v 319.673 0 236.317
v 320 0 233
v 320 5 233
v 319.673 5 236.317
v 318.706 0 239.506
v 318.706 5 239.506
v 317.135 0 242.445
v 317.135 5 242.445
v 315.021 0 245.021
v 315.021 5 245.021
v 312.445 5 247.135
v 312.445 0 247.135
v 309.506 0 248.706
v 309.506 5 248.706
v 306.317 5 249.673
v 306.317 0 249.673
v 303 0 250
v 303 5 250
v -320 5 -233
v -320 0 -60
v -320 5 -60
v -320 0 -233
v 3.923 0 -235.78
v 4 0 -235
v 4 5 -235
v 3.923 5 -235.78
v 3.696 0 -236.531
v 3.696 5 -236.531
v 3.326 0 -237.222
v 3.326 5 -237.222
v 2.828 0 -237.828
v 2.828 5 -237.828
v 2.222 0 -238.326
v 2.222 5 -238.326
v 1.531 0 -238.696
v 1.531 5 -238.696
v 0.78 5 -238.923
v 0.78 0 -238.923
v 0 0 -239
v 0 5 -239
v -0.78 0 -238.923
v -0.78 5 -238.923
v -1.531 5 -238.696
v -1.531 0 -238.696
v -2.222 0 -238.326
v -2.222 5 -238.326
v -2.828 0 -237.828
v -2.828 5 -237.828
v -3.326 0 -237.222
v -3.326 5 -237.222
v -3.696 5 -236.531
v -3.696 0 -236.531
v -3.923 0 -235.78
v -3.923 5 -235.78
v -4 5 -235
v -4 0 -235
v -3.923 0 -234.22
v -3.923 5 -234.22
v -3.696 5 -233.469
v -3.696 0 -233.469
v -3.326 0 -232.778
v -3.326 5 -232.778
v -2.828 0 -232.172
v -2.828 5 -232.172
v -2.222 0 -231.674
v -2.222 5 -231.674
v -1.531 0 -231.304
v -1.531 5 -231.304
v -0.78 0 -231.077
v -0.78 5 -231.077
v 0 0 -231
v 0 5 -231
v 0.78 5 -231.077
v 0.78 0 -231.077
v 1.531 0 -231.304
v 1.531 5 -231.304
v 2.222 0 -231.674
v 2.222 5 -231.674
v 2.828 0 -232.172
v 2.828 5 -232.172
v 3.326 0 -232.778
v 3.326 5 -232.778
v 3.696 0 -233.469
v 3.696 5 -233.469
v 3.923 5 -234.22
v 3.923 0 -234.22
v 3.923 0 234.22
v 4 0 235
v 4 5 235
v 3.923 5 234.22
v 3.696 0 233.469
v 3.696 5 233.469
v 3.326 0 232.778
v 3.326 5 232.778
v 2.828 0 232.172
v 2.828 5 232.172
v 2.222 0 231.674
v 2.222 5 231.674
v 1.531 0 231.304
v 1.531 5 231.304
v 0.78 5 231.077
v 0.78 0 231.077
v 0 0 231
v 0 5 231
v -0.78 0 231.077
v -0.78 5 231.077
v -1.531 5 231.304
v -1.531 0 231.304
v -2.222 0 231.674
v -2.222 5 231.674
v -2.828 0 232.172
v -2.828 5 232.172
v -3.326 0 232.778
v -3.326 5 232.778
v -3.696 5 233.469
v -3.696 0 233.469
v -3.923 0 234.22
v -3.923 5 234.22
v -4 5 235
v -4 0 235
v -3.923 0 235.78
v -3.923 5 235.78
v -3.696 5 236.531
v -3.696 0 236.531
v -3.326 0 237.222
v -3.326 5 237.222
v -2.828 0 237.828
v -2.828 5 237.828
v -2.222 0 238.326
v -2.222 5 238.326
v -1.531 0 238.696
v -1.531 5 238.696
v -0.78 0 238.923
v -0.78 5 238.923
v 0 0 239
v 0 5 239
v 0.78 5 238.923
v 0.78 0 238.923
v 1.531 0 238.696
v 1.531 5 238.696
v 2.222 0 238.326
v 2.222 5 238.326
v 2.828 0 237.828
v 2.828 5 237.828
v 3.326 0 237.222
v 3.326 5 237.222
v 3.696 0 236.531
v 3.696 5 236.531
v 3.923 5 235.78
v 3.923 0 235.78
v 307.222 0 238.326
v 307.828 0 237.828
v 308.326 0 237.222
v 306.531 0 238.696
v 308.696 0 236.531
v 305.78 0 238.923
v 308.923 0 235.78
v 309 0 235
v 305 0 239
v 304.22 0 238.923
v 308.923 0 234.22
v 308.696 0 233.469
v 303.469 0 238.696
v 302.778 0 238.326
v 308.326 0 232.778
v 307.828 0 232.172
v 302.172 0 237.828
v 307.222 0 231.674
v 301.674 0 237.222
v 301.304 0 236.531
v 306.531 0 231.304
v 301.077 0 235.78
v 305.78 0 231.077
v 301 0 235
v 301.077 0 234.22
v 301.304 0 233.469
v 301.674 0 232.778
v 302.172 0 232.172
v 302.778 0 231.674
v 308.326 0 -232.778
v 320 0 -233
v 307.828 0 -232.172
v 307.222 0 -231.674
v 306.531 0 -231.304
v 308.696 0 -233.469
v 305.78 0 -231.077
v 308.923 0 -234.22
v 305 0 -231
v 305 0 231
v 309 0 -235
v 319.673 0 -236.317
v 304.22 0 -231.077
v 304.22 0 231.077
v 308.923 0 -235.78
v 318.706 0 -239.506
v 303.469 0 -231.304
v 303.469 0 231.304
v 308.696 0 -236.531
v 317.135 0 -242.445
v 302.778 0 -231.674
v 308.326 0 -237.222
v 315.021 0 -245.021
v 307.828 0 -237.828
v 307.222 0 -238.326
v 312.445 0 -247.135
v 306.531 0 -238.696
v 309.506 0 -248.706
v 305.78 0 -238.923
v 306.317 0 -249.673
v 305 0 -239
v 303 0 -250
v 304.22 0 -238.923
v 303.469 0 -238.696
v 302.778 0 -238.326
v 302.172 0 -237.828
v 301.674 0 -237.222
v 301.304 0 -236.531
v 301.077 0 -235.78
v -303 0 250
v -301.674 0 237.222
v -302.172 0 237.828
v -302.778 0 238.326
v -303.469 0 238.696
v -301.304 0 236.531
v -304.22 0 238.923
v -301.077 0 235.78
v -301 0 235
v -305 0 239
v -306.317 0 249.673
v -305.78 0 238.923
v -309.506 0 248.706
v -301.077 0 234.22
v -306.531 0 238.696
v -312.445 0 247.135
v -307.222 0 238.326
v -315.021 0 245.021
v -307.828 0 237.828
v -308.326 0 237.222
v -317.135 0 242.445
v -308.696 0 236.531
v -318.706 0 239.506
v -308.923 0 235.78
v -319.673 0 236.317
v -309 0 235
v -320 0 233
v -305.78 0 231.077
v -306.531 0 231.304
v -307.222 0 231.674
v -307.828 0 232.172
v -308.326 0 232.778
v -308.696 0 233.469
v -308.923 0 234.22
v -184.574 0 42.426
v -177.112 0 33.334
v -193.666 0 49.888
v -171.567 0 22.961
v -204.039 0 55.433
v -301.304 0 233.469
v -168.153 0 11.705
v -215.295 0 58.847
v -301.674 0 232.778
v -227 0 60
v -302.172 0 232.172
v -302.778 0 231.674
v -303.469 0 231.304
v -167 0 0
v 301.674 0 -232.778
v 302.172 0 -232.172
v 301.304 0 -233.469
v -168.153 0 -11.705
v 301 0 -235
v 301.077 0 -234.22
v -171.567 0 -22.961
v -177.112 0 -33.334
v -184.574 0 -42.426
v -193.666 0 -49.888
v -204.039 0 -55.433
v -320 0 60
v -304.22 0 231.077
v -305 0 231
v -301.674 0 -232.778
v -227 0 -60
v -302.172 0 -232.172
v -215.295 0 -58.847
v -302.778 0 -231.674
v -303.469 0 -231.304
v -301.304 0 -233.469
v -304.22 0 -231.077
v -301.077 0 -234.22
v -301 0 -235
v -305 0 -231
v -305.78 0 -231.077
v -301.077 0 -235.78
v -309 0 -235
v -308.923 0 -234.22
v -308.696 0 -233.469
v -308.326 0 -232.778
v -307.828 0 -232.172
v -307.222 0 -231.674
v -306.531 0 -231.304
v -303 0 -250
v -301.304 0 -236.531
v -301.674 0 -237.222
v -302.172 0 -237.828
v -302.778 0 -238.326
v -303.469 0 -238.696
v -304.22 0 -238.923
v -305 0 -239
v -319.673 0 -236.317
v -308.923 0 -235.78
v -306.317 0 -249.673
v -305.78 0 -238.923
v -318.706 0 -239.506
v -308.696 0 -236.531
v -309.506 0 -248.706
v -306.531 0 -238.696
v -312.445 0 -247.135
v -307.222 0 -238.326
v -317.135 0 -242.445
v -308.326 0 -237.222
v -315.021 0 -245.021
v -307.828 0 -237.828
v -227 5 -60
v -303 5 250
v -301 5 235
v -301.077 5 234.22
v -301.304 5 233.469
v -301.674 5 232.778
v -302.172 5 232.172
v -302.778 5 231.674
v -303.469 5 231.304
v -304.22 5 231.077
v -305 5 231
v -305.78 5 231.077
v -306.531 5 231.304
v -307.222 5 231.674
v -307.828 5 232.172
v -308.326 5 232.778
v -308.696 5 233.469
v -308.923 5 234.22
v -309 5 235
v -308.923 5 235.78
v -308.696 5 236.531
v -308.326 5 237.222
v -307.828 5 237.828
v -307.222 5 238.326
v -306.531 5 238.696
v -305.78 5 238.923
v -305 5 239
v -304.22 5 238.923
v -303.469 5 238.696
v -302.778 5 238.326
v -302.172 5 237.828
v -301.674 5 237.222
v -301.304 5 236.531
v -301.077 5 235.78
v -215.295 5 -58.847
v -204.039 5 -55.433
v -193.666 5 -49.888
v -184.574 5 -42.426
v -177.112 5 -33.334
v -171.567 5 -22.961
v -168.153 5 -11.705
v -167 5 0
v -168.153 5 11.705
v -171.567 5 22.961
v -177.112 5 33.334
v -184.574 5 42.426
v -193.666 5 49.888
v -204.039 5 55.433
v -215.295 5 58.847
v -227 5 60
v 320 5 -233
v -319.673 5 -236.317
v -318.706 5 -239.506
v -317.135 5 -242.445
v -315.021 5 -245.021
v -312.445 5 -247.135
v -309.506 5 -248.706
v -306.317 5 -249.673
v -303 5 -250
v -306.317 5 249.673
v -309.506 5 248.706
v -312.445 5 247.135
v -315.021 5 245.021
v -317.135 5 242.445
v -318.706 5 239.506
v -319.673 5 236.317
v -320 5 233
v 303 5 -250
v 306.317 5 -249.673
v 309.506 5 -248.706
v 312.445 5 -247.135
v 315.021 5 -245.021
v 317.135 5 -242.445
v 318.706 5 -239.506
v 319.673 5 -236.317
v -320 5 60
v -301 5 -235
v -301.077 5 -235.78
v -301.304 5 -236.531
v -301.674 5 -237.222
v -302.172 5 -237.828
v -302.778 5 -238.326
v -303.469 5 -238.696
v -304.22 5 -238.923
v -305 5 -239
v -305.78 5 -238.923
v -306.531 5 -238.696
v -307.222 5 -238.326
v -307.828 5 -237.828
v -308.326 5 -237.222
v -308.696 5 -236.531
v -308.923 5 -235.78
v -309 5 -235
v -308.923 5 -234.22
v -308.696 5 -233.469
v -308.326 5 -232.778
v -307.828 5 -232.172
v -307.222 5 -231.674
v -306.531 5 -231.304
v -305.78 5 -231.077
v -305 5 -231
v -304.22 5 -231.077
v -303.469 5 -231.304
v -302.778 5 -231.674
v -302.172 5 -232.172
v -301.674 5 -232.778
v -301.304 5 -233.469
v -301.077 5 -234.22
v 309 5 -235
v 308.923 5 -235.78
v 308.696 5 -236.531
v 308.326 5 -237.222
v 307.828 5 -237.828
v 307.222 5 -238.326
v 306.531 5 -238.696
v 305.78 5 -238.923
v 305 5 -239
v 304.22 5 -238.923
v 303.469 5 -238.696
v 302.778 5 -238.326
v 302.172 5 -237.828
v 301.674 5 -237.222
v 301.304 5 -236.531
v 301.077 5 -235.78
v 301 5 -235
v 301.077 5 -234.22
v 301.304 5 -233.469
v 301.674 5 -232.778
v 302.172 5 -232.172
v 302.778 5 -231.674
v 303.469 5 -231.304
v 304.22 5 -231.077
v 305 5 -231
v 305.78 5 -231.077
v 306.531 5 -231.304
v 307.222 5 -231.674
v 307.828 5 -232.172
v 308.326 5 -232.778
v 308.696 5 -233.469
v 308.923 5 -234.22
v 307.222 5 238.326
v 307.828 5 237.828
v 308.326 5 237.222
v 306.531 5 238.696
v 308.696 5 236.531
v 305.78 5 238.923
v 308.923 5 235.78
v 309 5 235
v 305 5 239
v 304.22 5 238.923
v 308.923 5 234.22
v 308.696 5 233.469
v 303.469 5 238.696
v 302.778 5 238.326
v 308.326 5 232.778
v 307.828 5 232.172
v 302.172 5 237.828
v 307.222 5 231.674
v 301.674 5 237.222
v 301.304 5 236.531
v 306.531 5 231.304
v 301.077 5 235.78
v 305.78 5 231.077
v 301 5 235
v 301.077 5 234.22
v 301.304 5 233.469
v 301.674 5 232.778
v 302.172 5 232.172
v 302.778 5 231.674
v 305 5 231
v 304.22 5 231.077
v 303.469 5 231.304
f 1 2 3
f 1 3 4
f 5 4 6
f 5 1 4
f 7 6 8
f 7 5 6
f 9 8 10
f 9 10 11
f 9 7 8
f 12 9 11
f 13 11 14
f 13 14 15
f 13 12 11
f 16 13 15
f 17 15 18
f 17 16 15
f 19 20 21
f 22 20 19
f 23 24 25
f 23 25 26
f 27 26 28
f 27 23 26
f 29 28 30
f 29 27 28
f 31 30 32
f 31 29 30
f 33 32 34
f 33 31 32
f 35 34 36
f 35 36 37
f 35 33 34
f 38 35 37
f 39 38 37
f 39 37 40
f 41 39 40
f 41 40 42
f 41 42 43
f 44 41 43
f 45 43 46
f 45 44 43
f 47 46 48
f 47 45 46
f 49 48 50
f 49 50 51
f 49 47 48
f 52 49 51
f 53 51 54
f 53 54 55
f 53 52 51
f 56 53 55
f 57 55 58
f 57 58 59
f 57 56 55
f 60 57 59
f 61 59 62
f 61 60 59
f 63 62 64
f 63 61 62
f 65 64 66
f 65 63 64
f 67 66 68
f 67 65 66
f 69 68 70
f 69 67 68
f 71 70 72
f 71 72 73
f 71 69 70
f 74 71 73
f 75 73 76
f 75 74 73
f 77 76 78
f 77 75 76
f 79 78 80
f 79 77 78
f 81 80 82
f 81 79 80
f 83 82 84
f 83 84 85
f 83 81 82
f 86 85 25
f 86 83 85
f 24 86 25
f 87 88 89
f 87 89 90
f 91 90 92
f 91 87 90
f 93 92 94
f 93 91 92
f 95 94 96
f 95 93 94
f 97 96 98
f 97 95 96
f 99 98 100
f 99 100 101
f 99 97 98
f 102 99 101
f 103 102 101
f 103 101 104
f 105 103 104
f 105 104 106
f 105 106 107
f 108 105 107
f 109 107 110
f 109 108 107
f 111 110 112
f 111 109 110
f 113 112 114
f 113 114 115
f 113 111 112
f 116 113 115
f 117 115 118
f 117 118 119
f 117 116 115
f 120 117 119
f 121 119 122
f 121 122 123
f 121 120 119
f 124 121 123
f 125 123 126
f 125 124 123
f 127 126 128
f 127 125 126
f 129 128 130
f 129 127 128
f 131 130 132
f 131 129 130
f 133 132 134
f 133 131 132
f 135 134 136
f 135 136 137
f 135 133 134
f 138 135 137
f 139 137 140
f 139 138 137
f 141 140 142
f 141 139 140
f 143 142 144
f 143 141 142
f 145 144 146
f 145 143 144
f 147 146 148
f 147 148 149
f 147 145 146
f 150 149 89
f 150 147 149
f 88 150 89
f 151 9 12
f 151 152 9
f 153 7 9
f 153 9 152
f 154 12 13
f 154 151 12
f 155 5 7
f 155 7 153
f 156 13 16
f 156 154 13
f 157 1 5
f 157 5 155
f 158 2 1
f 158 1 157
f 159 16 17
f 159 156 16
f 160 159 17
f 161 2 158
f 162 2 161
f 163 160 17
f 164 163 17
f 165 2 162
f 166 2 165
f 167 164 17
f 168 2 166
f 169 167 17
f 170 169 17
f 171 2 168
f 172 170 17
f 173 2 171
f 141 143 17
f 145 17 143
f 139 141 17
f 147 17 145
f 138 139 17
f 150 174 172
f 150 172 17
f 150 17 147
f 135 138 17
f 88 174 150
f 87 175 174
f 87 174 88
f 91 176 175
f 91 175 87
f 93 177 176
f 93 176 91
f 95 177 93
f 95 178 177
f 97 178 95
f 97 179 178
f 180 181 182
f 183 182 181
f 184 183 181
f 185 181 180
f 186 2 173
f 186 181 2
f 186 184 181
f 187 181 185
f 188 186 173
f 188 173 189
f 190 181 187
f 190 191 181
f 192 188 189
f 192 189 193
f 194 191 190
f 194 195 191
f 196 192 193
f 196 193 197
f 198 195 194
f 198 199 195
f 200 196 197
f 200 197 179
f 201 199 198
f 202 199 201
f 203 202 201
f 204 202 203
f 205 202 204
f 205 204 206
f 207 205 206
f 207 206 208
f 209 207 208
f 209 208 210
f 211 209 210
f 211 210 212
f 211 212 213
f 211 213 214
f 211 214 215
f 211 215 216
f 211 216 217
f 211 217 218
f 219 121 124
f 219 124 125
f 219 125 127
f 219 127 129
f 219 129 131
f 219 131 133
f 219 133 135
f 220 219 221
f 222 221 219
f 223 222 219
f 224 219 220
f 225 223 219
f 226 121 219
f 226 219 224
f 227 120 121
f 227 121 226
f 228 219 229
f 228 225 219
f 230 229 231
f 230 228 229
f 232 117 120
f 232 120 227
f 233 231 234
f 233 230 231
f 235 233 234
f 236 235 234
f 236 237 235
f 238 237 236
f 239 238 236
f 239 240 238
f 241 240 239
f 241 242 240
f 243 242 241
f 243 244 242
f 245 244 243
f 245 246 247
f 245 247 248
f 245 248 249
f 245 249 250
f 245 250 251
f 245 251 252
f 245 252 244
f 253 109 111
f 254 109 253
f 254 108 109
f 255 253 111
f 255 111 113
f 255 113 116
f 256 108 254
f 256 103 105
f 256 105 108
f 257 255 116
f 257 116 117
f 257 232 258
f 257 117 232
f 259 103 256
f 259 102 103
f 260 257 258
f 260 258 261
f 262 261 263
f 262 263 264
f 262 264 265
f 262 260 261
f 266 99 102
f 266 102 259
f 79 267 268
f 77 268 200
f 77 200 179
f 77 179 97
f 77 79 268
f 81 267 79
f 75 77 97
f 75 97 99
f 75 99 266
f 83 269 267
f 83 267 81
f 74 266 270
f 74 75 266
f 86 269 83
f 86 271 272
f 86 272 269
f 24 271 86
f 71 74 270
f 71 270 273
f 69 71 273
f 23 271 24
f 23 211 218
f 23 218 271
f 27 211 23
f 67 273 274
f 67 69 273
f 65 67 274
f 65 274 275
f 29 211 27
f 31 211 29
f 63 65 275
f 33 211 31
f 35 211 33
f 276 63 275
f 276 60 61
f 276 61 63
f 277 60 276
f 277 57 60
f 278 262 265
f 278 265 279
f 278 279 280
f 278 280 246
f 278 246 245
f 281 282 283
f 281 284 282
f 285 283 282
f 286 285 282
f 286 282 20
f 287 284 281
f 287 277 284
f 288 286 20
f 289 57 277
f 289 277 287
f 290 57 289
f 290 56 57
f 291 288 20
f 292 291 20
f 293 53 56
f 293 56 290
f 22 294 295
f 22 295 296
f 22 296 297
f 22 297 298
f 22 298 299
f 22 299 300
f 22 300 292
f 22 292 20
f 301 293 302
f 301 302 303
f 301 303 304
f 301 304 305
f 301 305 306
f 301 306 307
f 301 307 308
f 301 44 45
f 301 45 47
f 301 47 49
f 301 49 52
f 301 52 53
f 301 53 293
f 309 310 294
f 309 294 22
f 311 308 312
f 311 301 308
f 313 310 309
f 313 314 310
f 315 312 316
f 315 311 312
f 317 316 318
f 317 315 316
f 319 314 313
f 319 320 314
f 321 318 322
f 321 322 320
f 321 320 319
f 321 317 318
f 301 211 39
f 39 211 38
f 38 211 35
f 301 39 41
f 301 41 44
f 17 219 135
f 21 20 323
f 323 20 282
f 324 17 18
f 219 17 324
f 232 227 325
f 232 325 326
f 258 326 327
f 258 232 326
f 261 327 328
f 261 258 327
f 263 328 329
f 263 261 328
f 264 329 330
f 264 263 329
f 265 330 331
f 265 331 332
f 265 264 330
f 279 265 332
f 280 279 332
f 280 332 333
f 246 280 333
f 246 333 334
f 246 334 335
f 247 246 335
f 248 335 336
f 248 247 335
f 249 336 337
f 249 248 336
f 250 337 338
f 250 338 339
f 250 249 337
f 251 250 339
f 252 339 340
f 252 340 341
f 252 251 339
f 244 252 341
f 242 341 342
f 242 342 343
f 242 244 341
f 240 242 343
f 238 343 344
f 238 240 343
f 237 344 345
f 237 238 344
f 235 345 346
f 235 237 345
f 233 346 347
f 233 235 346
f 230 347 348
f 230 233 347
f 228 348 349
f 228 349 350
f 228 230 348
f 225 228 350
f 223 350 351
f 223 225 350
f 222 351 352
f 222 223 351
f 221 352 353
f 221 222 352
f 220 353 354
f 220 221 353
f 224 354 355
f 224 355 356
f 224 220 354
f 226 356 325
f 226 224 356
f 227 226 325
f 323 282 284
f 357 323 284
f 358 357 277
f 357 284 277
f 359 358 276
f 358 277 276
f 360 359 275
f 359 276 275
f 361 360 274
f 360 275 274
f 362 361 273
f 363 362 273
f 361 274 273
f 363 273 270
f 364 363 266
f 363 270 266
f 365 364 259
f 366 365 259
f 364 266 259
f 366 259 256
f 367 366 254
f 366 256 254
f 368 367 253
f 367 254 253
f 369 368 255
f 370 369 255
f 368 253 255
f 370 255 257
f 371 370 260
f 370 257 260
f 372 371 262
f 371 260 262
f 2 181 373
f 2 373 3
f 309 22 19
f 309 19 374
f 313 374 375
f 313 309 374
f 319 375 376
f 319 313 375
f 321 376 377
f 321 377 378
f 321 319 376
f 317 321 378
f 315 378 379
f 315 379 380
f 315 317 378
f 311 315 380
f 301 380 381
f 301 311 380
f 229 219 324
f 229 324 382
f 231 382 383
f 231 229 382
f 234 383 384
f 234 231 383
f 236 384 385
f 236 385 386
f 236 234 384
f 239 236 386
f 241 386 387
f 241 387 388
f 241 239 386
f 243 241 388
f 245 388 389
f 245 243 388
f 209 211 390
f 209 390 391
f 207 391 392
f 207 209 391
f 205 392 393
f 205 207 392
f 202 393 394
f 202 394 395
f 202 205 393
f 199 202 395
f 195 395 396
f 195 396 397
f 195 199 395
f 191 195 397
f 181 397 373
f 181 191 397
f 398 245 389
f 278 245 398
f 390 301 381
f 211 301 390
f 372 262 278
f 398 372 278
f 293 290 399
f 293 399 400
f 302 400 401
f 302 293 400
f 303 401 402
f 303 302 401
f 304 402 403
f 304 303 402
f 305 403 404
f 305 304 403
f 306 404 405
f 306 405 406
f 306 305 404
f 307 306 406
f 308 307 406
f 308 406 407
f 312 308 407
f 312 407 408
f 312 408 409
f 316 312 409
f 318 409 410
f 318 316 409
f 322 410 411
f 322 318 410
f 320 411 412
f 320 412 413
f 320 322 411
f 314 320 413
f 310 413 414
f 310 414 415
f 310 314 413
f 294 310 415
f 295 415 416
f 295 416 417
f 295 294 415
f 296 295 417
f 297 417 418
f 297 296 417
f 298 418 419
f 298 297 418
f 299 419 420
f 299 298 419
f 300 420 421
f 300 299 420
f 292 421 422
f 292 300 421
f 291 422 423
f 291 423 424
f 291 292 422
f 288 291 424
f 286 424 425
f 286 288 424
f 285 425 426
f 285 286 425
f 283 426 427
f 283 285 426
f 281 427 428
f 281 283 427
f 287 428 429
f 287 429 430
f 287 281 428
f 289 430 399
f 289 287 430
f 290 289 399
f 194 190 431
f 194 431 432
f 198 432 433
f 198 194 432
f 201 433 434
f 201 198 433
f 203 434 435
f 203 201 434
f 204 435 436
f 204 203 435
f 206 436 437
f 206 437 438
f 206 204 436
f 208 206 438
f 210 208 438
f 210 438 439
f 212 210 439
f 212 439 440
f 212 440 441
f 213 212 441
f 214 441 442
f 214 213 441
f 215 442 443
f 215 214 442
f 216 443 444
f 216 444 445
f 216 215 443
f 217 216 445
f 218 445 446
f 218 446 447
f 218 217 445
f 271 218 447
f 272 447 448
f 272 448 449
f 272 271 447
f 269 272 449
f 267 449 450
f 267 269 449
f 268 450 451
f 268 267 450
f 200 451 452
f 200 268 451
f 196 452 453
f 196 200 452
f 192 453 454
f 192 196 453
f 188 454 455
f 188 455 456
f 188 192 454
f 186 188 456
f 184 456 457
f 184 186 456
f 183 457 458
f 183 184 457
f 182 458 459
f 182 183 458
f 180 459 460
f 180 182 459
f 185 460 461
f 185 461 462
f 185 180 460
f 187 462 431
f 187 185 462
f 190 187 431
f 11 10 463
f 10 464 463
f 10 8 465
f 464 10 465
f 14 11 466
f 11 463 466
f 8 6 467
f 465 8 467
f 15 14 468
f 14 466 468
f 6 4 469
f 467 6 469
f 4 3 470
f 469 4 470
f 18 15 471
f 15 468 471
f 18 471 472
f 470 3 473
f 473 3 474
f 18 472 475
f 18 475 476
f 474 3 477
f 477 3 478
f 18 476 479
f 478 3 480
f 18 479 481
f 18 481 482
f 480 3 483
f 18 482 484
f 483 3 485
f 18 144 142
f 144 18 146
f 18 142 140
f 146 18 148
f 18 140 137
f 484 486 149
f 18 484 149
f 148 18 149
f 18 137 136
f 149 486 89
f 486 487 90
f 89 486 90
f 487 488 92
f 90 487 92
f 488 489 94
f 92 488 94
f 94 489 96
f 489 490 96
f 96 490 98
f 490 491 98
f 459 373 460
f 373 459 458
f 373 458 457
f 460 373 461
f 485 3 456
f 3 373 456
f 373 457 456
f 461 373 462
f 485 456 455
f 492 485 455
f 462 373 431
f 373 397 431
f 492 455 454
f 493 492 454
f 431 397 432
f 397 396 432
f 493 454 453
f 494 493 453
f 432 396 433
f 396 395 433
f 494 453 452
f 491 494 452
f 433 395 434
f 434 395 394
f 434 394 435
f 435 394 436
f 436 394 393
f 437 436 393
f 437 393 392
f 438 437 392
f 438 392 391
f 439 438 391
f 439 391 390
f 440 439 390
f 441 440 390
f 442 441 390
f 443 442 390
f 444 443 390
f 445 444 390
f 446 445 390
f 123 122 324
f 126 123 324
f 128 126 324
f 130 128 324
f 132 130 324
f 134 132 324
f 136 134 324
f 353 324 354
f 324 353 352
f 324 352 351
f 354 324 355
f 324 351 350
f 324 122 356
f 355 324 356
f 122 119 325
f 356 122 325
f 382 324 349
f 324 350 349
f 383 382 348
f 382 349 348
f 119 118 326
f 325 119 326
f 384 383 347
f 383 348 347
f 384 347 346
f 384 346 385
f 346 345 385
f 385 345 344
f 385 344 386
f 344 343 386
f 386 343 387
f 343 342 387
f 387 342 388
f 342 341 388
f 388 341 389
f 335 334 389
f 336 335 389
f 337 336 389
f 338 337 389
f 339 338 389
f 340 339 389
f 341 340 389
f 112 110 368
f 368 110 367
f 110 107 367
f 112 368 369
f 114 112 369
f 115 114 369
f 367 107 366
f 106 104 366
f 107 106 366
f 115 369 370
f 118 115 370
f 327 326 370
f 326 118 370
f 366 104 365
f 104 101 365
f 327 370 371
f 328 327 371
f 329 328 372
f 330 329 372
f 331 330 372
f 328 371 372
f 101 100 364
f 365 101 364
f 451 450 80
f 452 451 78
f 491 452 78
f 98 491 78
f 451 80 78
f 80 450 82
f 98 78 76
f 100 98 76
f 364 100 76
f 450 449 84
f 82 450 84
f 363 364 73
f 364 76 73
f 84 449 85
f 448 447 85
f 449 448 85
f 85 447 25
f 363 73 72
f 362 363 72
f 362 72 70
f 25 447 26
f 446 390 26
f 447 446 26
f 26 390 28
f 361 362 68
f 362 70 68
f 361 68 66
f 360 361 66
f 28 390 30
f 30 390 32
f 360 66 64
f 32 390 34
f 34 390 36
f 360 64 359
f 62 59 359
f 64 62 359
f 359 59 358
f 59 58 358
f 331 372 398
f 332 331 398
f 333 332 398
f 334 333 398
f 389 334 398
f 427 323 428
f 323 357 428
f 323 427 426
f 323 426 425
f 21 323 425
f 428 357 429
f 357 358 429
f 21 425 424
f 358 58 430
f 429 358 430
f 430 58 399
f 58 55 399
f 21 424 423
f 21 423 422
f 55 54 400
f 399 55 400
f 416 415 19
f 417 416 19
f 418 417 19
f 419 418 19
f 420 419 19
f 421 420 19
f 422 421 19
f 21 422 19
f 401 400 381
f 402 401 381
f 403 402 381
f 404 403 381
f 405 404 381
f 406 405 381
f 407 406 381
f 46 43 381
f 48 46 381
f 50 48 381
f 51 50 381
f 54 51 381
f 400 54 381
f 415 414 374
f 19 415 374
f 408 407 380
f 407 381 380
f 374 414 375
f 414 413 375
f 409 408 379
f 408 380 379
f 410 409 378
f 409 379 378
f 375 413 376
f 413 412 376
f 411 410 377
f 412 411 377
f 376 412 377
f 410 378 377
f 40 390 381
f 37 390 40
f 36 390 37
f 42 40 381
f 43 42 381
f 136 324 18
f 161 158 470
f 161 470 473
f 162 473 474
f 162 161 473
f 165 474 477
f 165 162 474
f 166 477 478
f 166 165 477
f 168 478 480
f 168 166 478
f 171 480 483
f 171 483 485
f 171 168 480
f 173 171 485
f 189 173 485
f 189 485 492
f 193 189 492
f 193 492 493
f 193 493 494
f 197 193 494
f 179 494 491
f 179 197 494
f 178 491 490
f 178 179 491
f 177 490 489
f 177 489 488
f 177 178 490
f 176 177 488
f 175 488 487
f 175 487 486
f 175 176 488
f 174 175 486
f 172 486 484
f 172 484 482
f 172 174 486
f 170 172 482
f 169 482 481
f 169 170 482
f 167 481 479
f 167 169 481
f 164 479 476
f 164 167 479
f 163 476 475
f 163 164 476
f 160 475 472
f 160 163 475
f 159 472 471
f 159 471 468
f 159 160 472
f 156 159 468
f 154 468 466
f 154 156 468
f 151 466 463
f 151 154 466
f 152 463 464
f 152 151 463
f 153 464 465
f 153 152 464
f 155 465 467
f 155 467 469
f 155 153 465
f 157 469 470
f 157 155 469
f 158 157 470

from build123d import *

# Parameters (mm, degrees)
CROQUIS1_R              = 4
SALIENTE_EXTRUIR1_DEPTH = 5
CORTAR_EXTRUIR2_DEPTH   = 6


with BuildPart() as part:
    # Croquis1 → Saliente-Extruir1 (new body)
    with BuildSketch(Plane(origin=(0, 0, 0), x_dir=(1, 0, 0), z_dir=(0, 1, 0))):
        with BuildLine():
            Line((-303, 250), (303, 250))
            ThreePointArc((303, 250), (315.02081528, 245.02081528), (320, 233))
            Line((320, 233), (320, -233))
            ThreePointArc((320, -233), (315.02081528, -245.02081528), (303, -250))
            Line((303, -250), (-303, -250))
            ThreePointArc((-303, -250), (-315.02081528, -245.02081528), (-320, -233))
            Line((-320, -233), (-320, 233))
            ThreePointArc((-320, 233), (-315.02081528, 245.02081528), (-303, 250))
        make_face()
        with Locations((0, 235)):
            Circle(CROQUIS1_R, mode=Mode.SUBTRACT)
        with Locations((305, 235)):
            Circle(CROQUIS1_R, mode=Mode.SUBTRACT)
        with Locations((-305, 235)):
            Circle(CROQUIS1_R, mode=Mode.SUBTRACT)
        with Locations((0, -235)):
            Circle(CROQUIS1_R, mode=Mode.SUBTRACT)
        with Locations((305, -235)):
            Circle(CROQUIS1_R, mode=Mode.SUBTRACT)
        with Locations((-305, -235)):
            Circle(CROQUIS1_R, mode=Mode.SUBTRACT)
    extrude(amount=SALIENTE_EXTRUIR1_DEPTH)

    # Croquis3 → Cortar-Extruir2 (cut, through all)
    with BuildSketch(Plane.XZ):
        with BuildLine():
            Line((-227, 60), (-320, 60))
            Line((-320, 60), (-320, -60))
            Line((-320, -60), (-227, -60))
            ThreePointArc((-227, -60), (-167, 0), (-227, 60))
        make_face()
    extrude(amount=-CORTAR_EXTRUIR2_DEPTH, mode=Mode.SUBTRACT)


solid = part.part
